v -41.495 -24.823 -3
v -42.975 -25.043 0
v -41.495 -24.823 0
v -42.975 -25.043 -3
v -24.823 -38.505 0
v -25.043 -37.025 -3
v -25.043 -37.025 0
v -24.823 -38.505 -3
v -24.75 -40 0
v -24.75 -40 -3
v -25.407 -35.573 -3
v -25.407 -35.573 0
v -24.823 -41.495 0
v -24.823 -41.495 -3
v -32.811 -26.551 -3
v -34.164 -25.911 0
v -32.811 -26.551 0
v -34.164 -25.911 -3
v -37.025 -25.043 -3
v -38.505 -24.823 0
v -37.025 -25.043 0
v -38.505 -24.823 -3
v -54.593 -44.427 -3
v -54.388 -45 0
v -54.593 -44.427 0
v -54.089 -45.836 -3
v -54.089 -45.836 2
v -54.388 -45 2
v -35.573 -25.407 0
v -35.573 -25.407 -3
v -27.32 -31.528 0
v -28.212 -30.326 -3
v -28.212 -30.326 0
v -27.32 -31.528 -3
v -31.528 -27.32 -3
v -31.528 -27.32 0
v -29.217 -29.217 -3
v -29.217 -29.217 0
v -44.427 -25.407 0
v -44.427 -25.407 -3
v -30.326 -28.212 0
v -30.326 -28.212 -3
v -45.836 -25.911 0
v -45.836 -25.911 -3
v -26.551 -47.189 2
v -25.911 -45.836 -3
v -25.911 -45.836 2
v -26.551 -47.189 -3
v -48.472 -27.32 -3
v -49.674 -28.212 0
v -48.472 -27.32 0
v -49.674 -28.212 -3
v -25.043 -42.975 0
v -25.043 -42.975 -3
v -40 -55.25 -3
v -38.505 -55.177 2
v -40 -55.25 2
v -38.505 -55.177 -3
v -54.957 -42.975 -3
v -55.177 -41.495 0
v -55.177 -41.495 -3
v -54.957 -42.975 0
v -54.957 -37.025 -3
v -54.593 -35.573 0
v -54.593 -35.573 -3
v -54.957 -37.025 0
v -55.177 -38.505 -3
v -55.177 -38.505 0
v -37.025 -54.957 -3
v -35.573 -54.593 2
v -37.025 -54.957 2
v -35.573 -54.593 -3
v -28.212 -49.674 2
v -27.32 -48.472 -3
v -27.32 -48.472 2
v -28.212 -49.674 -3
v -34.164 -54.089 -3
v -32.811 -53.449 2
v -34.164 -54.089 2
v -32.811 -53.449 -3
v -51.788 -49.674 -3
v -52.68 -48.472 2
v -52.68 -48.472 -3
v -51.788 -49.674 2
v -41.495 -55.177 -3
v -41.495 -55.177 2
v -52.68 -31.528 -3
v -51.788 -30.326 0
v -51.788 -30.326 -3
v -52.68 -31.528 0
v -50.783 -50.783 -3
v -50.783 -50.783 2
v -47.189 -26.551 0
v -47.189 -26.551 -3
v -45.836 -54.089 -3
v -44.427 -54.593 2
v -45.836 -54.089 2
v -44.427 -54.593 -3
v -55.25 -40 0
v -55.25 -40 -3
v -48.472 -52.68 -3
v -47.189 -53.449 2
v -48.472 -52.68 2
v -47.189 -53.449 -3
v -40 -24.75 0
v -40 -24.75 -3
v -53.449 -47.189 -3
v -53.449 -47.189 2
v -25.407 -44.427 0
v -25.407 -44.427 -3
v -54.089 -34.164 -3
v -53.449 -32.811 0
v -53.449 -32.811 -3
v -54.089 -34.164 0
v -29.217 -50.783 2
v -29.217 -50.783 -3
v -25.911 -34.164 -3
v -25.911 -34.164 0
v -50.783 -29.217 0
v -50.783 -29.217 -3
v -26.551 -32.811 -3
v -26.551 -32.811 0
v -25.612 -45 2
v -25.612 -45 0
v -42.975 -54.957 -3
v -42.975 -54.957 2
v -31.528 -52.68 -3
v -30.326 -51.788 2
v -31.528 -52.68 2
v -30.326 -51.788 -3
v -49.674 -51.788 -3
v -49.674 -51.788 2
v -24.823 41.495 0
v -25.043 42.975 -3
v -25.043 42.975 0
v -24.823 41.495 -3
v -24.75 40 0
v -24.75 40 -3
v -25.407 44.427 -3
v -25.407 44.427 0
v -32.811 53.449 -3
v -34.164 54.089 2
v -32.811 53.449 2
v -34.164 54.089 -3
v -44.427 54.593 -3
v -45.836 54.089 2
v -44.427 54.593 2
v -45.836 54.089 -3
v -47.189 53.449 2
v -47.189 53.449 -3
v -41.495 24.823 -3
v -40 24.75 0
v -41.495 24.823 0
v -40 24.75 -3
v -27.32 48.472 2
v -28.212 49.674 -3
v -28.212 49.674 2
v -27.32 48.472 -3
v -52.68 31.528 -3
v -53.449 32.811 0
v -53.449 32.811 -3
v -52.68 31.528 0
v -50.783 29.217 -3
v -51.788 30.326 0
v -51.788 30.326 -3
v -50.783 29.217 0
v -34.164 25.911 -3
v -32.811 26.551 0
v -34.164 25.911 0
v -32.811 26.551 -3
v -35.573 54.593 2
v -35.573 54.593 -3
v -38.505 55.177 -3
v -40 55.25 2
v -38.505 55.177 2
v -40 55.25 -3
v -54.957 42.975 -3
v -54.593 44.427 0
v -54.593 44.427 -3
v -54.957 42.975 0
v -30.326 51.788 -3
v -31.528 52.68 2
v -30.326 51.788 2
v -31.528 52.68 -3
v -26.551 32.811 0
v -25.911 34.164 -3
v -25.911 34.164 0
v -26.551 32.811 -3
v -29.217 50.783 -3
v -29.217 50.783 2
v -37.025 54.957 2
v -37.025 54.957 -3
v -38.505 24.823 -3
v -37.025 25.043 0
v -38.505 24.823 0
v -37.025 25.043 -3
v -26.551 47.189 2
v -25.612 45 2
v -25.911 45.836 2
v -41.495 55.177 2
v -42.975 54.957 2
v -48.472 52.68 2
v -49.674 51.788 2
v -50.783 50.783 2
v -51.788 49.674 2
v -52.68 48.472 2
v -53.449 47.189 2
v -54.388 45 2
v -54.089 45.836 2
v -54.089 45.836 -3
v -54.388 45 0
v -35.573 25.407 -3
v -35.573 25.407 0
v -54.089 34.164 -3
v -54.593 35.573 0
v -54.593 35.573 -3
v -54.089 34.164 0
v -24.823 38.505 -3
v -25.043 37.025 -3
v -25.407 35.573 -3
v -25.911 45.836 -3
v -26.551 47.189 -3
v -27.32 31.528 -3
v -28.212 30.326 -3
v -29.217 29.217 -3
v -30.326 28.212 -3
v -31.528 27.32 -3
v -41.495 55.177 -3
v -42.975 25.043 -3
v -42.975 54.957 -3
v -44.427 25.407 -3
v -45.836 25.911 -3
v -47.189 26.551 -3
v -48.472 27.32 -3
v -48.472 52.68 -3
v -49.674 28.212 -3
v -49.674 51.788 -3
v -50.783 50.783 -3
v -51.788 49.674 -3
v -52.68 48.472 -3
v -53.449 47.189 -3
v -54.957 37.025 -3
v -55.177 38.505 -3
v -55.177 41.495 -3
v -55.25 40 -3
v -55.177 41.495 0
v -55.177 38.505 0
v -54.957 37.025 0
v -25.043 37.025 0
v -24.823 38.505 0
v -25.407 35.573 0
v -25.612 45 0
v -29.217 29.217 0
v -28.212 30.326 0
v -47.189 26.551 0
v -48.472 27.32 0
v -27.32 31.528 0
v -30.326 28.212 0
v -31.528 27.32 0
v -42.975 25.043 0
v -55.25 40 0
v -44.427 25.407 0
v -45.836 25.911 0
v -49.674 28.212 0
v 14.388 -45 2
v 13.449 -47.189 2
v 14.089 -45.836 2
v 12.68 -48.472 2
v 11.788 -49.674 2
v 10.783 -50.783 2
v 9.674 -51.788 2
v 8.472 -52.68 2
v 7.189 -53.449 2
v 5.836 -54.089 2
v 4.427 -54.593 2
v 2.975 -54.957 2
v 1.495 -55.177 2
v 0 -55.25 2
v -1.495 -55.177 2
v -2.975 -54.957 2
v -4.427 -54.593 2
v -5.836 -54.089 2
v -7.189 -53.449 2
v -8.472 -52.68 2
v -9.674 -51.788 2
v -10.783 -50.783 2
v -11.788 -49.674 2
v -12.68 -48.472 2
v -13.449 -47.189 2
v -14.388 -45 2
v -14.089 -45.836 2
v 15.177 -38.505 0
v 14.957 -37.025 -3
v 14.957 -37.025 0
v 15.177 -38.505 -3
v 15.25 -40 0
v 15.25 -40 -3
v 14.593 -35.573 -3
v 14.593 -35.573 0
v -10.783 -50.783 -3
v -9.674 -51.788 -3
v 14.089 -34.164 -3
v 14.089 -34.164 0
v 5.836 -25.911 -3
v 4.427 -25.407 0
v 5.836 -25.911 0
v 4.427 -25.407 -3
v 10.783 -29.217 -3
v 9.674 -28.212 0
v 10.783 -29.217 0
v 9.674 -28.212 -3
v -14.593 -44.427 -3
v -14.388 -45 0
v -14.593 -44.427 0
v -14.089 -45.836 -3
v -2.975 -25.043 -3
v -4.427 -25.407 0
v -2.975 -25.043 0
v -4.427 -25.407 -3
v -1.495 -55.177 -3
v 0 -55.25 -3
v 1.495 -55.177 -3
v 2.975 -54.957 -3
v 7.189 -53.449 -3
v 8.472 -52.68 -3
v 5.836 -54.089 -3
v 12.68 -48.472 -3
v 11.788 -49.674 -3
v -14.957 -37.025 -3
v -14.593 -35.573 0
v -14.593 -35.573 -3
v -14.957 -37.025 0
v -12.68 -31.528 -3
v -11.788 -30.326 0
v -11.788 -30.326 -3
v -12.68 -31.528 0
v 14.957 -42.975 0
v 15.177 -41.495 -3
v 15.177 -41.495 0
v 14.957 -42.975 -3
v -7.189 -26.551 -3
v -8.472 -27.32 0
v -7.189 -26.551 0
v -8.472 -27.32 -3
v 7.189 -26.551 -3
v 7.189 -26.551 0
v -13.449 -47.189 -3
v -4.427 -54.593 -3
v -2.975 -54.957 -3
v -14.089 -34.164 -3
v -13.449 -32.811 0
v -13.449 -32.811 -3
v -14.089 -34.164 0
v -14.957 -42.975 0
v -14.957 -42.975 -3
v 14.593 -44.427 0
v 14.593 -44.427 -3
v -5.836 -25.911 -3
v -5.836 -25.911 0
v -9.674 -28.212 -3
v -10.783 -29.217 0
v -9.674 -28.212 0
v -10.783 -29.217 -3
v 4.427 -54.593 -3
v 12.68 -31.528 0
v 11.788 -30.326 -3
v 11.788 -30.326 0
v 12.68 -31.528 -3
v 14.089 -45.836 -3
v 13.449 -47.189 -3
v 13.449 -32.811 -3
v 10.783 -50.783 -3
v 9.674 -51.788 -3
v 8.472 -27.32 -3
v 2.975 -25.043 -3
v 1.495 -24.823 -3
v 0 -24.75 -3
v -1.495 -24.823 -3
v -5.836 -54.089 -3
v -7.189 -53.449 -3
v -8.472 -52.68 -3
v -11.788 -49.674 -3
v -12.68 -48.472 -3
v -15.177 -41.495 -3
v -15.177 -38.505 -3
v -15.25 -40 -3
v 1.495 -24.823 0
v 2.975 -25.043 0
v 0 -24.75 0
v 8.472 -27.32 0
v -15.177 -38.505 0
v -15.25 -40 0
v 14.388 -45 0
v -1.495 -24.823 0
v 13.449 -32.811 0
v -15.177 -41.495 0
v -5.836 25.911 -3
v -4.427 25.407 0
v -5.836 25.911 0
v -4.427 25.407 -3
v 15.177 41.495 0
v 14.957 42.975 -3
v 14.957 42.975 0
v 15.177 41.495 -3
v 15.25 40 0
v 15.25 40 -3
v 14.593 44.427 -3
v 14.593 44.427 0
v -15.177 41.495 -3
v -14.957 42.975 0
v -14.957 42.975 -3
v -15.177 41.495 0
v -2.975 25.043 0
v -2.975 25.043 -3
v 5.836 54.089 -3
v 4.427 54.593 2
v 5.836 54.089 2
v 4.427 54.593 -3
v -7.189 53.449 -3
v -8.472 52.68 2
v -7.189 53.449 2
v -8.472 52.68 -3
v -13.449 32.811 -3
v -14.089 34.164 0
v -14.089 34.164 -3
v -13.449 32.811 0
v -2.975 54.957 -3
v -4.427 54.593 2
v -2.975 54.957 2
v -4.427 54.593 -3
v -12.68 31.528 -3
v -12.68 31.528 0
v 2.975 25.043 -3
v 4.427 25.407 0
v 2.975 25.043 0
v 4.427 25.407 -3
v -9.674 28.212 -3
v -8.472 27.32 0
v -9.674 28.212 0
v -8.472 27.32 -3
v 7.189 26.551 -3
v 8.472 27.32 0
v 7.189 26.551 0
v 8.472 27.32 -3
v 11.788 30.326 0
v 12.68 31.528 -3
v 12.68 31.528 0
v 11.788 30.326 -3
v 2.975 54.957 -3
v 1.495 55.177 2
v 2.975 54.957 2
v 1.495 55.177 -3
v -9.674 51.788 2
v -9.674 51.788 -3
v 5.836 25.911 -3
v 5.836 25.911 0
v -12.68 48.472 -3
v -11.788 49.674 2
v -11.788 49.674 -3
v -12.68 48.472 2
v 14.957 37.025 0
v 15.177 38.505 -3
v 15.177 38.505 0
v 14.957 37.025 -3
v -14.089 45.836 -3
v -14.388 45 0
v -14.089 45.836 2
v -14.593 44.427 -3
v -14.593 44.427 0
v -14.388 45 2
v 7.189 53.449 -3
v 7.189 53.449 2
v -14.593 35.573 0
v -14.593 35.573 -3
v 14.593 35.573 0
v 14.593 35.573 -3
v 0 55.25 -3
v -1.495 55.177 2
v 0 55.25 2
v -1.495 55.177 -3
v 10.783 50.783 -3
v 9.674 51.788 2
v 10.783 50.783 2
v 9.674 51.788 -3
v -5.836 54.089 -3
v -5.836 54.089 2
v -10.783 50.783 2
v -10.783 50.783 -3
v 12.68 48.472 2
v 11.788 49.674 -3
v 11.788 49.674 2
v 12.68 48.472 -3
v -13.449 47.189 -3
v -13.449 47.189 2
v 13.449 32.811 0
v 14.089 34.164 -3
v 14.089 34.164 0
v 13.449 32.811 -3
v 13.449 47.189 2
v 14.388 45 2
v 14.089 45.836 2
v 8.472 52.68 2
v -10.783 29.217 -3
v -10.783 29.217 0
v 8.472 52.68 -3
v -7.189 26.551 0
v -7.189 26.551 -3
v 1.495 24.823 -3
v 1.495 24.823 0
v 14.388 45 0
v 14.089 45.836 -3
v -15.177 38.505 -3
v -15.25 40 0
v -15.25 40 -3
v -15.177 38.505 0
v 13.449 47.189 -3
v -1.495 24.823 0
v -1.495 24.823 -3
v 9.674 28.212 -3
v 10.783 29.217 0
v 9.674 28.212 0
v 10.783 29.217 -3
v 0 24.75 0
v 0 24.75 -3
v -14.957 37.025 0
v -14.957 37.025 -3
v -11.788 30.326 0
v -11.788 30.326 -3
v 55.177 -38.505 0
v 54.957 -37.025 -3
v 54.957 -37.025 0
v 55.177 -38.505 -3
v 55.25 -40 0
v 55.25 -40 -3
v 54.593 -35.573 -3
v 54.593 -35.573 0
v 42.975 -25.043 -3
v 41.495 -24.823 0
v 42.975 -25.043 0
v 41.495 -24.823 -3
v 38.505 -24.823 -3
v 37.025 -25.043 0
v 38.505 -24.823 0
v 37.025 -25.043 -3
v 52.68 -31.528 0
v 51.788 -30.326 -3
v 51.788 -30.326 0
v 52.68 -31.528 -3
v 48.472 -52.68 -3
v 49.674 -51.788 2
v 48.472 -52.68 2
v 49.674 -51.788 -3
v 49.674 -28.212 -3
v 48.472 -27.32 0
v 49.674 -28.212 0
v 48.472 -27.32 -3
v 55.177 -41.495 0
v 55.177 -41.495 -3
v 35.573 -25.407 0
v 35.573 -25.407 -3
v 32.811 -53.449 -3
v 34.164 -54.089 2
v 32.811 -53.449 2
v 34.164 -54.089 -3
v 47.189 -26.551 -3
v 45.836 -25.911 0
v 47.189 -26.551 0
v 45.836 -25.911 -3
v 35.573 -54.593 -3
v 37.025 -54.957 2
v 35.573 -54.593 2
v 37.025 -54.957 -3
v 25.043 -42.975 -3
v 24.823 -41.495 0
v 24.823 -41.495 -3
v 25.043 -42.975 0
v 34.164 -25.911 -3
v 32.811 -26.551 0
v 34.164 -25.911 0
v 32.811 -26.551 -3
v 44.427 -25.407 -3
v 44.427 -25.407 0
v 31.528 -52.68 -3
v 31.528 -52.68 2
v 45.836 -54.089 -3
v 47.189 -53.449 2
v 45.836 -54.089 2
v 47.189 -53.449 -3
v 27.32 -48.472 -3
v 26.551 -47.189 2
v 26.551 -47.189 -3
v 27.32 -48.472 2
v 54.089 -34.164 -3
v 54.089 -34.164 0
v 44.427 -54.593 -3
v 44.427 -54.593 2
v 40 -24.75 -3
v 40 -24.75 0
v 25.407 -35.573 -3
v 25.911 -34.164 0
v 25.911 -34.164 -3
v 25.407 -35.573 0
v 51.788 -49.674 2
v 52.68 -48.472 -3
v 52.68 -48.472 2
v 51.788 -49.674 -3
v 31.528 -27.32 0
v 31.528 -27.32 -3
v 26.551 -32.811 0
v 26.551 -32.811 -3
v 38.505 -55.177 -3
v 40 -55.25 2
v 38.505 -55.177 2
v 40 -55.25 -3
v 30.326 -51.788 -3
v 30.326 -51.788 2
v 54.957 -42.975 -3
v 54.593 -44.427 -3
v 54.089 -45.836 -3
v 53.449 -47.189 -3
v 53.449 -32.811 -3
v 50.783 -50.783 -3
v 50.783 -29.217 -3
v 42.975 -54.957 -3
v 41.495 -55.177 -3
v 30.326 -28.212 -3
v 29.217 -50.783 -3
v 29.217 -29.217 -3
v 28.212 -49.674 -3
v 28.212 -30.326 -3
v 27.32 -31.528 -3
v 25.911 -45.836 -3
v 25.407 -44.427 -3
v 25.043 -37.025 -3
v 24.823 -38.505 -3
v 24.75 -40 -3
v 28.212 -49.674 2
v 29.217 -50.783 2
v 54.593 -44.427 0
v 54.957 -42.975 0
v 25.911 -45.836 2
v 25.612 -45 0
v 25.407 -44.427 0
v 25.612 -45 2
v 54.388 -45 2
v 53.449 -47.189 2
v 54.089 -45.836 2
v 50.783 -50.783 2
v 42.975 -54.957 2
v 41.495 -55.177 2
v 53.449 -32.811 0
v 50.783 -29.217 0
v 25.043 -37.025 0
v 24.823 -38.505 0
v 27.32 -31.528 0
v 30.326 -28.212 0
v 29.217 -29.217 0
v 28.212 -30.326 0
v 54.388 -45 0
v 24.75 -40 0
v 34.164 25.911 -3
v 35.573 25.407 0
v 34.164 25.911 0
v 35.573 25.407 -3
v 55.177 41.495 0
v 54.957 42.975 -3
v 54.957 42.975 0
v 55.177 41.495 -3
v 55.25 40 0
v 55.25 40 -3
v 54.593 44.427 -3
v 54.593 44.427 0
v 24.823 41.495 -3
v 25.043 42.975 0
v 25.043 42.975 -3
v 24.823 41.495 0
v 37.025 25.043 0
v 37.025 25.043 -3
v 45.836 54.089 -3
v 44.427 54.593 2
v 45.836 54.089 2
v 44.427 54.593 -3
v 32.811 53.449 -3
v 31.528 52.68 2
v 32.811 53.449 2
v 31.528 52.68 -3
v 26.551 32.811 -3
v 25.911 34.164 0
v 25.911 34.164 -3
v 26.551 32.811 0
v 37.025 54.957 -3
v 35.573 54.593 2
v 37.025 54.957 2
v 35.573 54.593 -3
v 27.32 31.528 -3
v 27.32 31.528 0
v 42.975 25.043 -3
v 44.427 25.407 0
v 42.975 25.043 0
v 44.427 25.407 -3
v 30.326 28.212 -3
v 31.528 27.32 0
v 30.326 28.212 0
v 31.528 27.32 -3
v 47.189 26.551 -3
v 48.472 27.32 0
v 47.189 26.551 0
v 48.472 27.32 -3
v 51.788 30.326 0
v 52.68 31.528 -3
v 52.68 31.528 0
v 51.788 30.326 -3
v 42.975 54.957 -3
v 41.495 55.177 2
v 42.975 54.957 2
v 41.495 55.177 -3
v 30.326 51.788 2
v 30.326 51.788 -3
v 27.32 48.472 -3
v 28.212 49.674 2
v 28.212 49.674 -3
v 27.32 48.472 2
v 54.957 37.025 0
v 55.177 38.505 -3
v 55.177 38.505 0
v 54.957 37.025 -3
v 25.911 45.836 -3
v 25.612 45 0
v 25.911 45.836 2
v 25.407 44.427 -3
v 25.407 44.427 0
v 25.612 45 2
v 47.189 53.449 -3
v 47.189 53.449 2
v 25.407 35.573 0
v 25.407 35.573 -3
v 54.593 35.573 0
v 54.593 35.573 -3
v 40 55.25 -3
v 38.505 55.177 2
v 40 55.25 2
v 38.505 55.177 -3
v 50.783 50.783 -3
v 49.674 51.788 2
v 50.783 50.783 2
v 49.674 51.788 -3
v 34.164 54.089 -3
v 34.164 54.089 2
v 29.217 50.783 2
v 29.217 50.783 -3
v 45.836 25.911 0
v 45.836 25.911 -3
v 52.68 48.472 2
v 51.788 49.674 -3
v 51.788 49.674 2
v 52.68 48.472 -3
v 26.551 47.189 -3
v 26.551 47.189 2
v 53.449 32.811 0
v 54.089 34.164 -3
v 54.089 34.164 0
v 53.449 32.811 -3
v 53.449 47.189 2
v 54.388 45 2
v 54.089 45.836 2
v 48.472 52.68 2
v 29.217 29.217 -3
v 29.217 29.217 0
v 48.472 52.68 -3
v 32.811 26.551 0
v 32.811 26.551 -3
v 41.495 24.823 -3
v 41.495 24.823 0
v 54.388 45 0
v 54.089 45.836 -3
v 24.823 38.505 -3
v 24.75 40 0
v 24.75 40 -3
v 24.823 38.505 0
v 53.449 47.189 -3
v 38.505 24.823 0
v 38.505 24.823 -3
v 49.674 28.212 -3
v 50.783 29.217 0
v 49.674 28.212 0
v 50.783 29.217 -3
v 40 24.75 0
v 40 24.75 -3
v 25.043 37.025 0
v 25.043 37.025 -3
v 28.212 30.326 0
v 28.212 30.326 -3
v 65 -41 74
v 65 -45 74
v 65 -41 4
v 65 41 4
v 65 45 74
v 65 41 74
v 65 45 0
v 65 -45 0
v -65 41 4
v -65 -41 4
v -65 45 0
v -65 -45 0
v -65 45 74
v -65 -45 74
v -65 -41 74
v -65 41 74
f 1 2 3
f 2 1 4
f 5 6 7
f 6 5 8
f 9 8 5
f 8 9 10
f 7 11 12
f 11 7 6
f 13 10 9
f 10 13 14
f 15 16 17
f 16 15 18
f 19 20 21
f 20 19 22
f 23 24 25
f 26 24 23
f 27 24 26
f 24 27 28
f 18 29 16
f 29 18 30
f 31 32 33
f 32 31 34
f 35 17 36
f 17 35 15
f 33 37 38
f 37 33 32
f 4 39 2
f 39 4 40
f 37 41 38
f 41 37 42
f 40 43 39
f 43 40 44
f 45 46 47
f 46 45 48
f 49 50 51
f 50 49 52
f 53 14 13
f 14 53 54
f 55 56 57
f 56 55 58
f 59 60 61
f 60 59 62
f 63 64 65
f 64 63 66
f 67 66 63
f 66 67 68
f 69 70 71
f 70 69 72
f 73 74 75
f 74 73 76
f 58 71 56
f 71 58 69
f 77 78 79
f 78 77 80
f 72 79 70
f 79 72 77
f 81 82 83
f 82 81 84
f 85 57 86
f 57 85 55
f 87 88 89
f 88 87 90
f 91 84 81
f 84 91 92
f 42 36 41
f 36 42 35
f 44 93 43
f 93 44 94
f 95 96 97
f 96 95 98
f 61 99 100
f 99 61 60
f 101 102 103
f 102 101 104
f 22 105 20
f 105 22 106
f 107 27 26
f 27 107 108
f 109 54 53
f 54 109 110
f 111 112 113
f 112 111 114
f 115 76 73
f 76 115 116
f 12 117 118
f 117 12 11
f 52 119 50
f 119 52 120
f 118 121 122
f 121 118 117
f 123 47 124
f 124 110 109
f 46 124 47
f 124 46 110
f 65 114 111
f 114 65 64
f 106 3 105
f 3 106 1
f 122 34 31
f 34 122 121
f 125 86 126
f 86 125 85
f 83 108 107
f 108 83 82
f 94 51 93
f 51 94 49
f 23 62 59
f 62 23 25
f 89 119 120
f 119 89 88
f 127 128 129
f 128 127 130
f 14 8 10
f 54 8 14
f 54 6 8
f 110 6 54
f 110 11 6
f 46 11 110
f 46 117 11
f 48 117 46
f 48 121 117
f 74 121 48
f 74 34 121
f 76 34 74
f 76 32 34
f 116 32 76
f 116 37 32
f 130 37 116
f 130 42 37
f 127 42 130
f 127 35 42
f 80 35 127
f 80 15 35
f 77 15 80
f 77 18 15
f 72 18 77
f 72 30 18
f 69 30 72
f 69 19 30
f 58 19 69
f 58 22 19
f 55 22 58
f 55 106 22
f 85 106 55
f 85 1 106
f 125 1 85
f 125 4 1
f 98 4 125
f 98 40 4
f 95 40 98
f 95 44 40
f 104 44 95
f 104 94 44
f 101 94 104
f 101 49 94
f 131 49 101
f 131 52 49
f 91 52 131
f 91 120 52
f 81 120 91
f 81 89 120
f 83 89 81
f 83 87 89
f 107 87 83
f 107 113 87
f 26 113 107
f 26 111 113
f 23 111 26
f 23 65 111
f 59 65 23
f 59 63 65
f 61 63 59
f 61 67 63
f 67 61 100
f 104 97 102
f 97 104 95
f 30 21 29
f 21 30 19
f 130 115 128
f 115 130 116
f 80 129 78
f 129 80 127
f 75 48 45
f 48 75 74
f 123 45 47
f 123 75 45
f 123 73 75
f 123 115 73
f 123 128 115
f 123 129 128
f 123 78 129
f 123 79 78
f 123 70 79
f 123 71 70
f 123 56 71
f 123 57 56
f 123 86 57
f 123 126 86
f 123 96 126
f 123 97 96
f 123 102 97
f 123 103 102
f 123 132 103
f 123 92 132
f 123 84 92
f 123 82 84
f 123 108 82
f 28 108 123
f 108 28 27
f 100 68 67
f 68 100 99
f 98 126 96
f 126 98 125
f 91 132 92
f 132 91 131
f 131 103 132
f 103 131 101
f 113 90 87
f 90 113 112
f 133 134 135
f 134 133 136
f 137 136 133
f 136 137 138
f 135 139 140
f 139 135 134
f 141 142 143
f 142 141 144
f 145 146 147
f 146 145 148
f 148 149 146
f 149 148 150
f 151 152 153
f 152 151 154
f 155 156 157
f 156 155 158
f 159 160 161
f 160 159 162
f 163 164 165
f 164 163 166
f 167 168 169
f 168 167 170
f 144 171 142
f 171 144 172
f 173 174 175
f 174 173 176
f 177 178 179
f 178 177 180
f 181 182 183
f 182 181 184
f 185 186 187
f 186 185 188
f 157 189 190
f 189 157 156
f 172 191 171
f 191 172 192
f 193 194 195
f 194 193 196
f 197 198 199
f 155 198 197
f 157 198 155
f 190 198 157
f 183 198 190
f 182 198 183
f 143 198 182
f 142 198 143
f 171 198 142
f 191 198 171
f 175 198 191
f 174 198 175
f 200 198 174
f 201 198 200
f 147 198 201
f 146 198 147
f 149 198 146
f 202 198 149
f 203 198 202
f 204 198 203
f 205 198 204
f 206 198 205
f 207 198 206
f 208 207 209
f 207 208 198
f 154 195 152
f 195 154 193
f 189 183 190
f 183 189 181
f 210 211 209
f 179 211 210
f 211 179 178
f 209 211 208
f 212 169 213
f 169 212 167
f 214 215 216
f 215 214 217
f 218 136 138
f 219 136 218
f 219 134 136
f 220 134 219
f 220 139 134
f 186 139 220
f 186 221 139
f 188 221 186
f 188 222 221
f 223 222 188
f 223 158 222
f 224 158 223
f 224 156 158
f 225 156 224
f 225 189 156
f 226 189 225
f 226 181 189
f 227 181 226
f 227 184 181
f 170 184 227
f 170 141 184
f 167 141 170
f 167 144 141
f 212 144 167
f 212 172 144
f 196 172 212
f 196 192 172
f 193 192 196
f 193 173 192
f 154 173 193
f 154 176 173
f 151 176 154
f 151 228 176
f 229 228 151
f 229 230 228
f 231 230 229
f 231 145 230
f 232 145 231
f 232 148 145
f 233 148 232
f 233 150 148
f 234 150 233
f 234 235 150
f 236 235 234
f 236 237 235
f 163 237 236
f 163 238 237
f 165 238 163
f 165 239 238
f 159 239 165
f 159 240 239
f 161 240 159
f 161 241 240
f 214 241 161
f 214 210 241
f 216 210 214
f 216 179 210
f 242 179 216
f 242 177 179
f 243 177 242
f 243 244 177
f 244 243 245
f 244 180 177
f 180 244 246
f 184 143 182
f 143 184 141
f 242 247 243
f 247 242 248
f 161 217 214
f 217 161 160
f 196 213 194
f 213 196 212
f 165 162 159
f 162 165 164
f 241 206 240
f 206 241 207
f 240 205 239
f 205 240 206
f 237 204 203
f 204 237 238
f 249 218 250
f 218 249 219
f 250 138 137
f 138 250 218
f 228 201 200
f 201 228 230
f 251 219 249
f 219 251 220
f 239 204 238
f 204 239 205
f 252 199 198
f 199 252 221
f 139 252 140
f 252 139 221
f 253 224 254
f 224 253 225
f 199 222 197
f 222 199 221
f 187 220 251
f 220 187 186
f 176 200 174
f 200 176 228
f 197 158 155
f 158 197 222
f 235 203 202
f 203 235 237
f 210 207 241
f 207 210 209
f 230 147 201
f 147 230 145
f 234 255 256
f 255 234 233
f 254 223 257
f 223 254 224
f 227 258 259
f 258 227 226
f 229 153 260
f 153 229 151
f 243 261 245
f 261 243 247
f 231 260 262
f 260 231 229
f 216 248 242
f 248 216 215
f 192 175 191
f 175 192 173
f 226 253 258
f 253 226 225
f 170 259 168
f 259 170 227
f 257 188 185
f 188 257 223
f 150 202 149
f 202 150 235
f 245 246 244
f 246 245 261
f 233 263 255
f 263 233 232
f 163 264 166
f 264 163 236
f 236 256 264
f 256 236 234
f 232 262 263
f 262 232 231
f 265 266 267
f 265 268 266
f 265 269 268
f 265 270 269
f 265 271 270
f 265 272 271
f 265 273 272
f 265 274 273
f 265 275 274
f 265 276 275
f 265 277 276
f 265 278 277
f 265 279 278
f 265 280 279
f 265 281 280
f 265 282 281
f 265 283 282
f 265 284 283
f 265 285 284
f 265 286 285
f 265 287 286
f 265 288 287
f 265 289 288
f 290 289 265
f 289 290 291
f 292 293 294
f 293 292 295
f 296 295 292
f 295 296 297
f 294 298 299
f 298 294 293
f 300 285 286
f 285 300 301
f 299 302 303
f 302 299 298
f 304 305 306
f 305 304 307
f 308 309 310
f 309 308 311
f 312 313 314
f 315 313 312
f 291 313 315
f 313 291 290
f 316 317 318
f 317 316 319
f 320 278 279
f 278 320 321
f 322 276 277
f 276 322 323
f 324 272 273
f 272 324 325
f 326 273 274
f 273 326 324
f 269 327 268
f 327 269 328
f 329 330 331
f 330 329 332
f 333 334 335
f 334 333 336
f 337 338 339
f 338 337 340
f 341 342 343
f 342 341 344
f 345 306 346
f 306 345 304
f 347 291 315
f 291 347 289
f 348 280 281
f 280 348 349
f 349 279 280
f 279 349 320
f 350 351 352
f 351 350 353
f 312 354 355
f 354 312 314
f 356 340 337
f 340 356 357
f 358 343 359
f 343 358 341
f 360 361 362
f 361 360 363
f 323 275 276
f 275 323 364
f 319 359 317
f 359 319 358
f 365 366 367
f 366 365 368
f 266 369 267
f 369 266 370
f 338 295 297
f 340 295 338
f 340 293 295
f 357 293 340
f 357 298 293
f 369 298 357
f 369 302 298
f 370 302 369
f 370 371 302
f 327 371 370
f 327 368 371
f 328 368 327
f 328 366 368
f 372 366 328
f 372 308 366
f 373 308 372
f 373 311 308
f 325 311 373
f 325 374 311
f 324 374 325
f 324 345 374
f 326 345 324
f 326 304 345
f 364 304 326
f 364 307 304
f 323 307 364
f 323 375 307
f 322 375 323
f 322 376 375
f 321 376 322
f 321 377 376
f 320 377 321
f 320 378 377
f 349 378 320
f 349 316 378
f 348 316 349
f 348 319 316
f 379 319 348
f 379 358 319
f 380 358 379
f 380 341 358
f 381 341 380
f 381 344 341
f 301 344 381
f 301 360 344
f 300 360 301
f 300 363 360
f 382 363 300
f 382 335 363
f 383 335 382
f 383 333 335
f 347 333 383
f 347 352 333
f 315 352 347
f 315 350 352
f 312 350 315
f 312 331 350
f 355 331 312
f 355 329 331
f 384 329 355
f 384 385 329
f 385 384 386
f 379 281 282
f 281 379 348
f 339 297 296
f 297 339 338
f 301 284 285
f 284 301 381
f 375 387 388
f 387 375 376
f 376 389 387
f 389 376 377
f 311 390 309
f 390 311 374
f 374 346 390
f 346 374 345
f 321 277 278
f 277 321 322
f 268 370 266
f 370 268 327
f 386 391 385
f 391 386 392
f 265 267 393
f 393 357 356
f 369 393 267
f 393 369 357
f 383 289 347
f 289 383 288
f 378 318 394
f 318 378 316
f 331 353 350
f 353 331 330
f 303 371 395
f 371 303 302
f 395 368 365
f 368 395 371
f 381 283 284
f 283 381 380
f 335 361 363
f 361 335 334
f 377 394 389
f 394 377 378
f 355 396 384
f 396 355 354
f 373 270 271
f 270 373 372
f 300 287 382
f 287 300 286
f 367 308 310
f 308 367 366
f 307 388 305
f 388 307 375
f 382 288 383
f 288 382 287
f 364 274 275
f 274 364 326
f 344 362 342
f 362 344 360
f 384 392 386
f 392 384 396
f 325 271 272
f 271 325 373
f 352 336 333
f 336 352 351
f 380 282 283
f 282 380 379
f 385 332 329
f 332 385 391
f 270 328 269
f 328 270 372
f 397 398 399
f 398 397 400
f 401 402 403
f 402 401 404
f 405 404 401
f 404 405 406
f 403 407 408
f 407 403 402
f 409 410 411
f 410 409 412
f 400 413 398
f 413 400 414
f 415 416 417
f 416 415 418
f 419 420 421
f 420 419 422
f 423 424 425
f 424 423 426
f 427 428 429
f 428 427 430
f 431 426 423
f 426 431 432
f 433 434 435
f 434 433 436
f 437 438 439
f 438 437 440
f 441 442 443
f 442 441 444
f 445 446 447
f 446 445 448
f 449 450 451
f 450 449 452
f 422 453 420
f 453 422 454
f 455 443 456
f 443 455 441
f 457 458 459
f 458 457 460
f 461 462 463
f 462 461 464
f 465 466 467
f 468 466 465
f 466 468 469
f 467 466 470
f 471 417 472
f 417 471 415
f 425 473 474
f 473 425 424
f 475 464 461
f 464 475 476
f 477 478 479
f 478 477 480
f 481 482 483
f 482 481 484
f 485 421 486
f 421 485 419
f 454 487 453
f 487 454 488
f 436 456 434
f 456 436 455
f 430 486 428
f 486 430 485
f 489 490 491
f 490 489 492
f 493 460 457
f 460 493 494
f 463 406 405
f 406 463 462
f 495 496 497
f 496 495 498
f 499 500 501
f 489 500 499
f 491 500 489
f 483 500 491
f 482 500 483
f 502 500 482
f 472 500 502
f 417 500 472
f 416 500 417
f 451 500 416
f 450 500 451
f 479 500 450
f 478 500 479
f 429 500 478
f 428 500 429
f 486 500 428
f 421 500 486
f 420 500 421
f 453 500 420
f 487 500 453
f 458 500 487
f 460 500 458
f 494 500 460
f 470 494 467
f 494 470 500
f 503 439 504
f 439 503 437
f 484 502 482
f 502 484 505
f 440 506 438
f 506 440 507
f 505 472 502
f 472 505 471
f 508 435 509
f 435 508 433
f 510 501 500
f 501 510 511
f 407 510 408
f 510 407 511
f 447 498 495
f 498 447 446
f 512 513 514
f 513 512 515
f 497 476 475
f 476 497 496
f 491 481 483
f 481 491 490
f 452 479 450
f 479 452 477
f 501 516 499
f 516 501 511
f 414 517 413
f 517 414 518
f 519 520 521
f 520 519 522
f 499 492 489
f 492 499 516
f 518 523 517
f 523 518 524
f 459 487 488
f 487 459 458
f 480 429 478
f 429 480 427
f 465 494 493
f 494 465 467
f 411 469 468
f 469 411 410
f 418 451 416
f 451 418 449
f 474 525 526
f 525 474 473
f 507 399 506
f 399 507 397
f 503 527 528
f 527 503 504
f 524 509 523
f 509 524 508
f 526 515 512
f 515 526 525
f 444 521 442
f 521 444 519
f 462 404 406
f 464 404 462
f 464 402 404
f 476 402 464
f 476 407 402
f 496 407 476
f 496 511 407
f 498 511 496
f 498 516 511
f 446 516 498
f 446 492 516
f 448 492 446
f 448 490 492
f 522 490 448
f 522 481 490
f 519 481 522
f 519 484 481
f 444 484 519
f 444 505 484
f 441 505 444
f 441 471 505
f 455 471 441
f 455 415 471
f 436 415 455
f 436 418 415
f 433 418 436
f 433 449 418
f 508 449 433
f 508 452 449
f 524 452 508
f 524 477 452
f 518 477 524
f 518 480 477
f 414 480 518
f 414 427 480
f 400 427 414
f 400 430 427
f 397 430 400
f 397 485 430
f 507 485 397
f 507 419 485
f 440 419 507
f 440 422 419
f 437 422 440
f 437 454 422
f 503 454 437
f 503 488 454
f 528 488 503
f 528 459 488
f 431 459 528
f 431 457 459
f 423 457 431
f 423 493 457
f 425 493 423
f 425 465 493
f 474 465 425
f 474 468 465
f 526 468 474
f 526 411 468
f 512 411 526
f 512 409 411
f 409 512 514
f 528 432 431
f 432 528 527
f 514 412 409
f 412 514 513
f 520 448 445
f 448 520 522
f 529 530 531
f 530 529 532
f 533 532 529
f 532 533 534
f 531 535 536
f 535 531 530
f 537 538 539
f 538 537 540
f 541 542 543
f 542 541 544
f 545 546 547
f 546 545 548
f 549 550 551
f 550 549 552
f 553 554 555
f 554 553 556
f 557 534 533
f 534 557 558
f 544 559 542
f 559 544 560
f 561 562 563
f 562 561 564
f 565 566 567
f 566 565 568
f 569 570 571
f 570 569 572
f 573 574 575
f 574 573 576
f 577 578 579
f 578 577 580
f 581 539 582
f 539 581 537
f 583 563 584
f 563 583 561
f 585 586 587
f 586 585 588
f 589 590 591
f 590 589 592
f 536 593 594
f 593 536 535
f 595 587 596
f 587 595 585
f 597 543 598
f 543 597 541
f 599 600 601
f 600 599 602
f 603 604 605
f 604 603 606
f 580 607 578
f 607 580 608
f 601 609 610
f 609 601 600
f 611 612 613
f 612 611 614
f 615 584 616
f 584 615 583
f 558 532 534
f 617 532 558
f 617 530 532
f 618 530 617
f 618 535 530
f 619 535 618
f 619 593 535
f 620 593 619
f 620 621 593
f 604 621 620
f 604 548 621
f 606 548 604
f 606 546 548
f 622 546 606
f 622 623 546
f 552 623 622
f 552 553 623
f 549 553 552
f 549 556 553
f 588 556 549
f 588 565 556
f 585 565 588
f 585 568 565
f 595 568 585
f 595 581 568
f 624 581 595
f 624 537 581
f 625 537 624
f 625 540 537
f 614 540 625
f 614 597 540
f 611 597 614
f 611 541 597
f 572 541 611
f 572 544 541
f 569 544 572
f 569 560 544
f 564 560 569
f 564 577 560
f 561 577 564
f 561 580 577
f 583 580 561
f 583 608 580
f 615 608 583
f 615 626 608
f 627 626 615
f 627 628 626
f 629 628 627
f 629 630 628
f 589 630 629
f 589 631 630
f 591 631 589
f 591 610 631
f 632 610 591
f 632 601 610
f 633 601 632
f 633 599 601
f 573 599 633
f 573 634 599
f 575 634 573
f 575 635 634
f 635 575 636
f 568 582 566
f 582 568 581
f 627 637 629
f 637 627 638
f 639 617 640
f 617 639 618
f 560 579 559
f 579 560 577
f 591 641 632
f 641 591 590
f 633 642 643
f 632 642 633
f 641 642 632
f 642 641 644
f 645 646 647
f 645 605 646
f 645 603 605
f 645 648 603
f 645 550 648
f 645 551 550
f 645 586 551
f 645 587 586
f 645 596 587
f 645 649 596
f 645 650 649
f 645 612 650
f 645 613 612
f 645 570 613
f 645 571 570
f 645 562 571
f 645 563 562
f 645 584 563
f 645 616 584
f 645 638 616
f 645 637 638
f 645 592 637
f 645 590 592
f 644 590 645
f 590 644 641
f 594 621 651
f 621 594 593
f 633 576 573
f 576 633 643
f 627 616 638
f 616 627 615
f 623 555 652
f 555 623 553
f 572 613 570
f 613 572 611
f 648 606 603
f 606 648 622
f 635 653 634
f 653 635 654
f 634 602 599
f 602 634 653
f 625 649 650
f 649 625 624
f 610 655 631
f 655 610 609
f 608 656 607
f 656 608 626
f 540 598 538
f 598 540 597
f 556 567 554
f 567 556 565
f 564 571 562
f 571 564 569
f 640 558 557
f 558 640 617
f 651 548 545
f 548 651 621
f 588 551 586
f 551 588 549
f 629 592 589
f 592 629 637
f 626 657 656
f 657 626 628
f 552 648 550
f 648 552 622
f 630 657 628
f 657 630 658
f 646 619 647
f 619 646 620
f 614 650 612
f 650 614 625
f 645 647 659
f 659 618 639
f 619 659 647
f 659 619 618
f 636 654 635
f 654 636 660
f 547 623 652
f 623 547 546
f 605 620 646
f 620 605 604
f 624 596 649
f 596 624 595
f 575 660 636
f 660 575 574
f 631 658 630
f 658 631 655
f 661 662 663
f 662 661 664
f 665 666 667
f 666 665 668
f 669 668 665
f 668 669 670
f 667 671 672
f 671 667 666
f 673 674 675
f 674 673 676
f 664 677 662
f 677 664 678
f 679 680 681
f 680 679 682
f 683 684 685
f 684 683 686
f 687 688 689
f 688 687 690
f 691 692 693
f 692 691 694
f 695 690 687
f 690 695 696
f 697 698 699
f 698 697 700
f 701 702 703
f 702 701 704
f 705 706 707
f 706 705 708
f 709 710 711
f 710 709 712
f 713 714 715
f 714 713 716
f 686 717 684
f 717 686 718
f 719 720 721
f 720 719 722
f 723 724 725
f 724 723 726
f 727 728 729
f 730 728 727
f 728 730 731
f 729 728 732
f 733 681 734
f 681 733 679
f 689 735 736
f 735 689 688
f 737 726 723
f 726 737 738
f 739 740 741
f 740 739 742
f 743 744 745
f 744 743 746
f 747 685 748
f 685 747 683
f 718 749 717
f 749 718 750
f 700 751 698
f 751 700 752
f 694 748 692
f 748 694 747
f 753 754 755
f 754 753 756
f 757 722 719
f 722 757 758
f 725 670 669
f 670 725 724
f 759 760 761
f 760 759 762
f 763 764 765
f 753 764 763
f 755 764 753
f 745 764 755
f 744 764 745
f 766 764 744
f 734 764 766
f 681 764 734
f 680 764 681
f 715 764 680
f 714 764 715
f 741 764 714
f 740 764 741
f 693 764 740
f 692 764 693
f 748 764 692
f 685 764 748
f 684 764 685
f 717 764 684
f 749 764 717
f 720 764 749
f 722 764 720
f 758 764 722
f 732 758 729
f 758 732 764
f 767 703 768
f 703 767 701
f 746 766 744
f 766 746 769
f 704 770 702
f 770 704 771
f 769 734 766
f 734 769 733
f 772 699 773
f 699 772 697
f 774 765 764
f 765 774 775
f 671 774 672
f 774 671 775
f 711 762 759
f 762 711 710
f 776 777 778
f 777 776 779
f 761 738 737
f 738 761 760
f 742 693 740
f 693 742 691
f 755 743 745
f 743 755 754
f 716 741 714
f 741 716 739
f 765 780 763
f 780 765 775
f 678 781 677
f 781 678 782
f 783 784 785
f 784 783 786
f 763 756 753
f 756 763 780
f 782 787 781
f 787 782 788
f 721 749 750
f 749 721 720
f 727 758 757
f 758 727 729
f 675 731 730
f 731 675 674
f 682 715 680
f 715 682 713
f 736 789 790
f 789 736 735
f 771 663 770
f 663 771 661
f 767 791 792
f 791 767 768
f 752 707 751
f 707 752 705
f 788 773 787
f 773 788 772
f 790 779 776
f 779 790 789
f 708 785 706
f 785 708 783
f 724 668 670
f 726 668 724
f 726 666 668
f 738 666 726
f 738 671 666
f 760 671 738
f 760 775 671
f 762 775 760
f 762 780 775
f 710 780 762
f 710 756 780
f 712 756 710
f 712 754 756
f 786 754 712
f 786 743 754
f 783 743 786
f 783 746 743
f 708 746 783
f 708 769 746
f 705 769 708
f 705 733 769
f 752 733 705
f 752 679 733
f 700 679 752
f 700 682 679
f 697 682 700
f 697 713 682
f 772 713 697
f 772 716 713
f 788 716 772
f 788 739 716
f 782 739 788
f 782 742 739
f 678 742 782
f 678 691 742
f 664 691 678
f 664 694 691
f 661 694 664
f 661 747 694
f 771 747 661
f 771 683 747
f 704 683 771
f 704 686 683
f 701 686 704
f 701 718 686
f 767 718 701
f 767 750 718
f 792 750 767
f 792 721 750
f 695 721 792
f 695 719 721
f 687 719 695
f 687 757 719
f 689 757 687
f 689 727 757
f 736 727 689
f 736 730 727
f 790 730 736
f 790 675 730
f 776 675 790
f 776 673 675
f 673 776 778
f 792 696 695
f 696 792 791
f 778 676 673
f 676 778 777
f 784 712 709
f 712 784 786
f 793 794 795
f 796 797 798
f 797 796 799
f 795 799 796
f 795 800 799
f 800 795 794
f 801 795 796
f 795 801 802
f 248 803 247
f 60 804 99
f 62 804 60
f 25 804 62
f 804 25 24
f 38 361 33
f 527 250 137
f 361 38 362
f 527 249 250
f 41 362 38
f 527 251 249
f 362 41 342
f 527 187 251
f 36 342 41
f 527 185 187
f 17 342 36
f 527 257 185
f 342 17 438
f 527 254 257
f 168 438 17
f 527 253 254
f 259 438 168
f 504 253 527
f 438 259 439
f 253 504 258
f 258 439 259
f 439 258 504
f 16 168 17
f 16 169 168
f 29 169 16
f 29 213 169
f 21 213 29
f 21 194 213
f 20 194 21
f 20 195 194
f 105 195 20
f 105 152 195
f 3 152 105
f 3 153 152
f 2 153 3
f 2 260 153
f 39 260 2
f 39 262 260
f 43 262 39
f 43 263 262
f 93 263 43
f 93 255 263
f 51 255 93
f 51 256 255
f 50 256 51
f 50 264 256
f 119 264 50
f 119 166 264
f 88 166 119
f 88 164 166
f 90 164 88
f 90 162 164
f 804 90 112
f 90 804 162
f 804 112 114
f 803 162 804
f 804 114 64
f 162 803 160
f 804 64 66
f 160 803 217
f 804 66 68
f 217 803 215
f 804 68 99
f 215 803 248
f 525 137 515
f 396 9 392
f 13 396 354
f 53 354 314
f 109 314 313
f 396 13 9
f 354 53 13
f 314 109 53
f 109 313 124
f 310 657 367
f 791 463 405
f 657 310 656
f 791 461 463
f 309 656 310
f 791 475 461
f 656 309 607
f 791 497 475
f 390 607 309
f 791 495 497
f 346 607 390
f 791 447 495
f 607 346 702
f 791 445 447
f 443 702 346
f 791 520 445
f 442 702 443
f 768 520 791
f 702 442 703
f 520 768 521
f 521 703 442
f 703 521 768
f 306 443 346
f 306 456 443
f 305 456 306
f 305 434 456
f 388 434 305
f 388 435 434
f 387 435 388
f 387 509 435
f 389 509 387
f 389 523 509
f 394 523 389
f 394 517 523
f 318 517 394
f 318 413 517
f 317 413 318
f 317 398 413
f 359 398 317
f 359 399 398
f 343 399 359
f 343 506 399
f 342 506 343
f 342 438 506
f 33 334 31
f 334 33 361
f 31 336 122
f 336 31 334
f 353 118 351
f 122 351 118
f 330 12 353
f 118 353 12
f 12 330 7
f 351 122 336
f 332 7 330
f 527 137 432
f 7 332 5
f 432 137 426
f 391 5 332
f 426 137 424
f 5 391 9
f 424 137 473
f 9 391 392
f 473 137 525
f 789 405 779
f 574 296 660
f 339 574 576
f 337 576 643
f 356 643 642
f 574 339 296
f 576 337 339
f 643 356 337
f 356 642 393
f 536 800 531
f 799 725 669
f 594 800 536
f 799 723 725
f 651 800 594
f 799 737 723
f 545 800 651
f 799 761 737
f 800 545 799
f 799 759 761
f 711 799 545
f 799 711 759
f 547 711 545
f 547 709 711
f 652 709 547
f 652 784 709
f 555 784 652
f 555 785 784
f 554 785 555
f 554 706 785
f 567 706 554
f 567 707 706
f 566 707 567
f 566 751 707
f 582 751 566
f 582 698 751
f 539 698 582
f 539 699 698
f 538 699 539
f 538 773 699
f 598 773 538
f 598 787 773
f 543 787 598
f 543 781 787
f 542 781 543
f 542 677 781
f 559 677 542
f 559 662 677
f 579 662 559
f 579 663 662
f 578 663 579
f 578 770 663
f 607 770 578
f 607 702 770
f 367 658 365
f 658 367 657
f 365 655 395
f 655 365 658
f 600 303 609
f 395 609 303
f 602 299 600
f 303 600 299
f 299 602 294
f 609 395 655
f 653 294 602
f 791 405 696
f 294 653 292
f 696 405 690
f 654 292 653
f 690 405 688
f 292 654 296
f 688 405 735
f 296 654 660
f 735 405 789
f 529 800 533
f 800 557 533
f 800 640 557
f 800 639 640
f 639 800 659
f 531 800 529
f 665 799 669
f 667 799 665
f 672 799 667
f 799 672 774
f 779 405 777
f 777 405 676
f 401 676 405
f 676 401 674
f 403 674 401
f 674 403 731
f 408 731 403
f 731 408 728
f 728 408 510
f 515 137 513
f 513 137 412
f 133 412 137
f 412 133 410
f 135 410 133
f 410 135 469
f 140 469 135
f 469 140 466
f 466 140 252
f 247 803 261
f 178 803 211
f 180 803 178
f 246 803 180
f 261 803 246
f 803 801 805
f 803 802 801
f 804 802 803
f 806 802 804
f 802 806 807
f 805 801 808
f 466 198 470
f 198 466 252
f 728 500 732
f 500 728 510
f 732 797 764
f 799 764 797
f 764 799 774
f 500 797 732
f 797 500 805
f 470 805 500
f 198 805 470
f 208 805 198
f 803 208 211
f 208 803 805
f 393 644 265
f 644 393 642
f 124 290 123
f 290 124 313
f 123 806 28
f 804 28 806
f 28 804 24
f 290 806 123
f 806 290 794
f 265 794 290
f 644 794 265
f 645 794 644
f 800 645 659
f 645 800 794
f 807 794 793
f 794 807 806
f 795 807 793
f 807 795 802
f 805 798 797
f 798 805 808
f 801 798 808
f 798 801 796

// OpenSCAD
// Dimensions (mm)
plate_x = 130;
plate_y = 90;
plate_z = 4;

hole_dia = 30.5;
hole_r = hole_dia / 2;

// Grid layout
hole_spacing_x = 40;
hole_spacing_y = 40;

// Walls
wall_height = 70;
wall_thickness = 4;

// Quality
$fn = 64;

// Main plate
translate([-plate_x/2, -plate_y/2, 0])
    cube([plate_x, plate_y, plate_z]);

// Walls along the long edges (Y direction edges, i.e., at y = -plate_y/2 and y = plate_y/2)
// Left wall (at y = -plate_y/2)
translate([-plate_x/2, -plate_y/2, plate_z])
    cube([plate_x, wall_thickness, wall_height]);

// Right wall (at y = plate_y/2 - wall_thickness to be flush with edge)
translate([-plate_x/2, plate_y/2 - wall_thickness, plate_z])
    cube([plate_x, wall_thickness, wall_height]);

// Holes: 2 rows (Y) x 3 columns (X)
// Centred on plate
// X positions: -40, 0, +40
// Y positions: -20, +20
for (xi = [-1, 0, 1]) {
    for (yi = [-1, 1]) {
        translate([xi * hole_spacing_x, yi * hole_spacing_y, -0.5])
            cylinder(r = hole_r, h = plate_z + 1, center = true);
    }
}
